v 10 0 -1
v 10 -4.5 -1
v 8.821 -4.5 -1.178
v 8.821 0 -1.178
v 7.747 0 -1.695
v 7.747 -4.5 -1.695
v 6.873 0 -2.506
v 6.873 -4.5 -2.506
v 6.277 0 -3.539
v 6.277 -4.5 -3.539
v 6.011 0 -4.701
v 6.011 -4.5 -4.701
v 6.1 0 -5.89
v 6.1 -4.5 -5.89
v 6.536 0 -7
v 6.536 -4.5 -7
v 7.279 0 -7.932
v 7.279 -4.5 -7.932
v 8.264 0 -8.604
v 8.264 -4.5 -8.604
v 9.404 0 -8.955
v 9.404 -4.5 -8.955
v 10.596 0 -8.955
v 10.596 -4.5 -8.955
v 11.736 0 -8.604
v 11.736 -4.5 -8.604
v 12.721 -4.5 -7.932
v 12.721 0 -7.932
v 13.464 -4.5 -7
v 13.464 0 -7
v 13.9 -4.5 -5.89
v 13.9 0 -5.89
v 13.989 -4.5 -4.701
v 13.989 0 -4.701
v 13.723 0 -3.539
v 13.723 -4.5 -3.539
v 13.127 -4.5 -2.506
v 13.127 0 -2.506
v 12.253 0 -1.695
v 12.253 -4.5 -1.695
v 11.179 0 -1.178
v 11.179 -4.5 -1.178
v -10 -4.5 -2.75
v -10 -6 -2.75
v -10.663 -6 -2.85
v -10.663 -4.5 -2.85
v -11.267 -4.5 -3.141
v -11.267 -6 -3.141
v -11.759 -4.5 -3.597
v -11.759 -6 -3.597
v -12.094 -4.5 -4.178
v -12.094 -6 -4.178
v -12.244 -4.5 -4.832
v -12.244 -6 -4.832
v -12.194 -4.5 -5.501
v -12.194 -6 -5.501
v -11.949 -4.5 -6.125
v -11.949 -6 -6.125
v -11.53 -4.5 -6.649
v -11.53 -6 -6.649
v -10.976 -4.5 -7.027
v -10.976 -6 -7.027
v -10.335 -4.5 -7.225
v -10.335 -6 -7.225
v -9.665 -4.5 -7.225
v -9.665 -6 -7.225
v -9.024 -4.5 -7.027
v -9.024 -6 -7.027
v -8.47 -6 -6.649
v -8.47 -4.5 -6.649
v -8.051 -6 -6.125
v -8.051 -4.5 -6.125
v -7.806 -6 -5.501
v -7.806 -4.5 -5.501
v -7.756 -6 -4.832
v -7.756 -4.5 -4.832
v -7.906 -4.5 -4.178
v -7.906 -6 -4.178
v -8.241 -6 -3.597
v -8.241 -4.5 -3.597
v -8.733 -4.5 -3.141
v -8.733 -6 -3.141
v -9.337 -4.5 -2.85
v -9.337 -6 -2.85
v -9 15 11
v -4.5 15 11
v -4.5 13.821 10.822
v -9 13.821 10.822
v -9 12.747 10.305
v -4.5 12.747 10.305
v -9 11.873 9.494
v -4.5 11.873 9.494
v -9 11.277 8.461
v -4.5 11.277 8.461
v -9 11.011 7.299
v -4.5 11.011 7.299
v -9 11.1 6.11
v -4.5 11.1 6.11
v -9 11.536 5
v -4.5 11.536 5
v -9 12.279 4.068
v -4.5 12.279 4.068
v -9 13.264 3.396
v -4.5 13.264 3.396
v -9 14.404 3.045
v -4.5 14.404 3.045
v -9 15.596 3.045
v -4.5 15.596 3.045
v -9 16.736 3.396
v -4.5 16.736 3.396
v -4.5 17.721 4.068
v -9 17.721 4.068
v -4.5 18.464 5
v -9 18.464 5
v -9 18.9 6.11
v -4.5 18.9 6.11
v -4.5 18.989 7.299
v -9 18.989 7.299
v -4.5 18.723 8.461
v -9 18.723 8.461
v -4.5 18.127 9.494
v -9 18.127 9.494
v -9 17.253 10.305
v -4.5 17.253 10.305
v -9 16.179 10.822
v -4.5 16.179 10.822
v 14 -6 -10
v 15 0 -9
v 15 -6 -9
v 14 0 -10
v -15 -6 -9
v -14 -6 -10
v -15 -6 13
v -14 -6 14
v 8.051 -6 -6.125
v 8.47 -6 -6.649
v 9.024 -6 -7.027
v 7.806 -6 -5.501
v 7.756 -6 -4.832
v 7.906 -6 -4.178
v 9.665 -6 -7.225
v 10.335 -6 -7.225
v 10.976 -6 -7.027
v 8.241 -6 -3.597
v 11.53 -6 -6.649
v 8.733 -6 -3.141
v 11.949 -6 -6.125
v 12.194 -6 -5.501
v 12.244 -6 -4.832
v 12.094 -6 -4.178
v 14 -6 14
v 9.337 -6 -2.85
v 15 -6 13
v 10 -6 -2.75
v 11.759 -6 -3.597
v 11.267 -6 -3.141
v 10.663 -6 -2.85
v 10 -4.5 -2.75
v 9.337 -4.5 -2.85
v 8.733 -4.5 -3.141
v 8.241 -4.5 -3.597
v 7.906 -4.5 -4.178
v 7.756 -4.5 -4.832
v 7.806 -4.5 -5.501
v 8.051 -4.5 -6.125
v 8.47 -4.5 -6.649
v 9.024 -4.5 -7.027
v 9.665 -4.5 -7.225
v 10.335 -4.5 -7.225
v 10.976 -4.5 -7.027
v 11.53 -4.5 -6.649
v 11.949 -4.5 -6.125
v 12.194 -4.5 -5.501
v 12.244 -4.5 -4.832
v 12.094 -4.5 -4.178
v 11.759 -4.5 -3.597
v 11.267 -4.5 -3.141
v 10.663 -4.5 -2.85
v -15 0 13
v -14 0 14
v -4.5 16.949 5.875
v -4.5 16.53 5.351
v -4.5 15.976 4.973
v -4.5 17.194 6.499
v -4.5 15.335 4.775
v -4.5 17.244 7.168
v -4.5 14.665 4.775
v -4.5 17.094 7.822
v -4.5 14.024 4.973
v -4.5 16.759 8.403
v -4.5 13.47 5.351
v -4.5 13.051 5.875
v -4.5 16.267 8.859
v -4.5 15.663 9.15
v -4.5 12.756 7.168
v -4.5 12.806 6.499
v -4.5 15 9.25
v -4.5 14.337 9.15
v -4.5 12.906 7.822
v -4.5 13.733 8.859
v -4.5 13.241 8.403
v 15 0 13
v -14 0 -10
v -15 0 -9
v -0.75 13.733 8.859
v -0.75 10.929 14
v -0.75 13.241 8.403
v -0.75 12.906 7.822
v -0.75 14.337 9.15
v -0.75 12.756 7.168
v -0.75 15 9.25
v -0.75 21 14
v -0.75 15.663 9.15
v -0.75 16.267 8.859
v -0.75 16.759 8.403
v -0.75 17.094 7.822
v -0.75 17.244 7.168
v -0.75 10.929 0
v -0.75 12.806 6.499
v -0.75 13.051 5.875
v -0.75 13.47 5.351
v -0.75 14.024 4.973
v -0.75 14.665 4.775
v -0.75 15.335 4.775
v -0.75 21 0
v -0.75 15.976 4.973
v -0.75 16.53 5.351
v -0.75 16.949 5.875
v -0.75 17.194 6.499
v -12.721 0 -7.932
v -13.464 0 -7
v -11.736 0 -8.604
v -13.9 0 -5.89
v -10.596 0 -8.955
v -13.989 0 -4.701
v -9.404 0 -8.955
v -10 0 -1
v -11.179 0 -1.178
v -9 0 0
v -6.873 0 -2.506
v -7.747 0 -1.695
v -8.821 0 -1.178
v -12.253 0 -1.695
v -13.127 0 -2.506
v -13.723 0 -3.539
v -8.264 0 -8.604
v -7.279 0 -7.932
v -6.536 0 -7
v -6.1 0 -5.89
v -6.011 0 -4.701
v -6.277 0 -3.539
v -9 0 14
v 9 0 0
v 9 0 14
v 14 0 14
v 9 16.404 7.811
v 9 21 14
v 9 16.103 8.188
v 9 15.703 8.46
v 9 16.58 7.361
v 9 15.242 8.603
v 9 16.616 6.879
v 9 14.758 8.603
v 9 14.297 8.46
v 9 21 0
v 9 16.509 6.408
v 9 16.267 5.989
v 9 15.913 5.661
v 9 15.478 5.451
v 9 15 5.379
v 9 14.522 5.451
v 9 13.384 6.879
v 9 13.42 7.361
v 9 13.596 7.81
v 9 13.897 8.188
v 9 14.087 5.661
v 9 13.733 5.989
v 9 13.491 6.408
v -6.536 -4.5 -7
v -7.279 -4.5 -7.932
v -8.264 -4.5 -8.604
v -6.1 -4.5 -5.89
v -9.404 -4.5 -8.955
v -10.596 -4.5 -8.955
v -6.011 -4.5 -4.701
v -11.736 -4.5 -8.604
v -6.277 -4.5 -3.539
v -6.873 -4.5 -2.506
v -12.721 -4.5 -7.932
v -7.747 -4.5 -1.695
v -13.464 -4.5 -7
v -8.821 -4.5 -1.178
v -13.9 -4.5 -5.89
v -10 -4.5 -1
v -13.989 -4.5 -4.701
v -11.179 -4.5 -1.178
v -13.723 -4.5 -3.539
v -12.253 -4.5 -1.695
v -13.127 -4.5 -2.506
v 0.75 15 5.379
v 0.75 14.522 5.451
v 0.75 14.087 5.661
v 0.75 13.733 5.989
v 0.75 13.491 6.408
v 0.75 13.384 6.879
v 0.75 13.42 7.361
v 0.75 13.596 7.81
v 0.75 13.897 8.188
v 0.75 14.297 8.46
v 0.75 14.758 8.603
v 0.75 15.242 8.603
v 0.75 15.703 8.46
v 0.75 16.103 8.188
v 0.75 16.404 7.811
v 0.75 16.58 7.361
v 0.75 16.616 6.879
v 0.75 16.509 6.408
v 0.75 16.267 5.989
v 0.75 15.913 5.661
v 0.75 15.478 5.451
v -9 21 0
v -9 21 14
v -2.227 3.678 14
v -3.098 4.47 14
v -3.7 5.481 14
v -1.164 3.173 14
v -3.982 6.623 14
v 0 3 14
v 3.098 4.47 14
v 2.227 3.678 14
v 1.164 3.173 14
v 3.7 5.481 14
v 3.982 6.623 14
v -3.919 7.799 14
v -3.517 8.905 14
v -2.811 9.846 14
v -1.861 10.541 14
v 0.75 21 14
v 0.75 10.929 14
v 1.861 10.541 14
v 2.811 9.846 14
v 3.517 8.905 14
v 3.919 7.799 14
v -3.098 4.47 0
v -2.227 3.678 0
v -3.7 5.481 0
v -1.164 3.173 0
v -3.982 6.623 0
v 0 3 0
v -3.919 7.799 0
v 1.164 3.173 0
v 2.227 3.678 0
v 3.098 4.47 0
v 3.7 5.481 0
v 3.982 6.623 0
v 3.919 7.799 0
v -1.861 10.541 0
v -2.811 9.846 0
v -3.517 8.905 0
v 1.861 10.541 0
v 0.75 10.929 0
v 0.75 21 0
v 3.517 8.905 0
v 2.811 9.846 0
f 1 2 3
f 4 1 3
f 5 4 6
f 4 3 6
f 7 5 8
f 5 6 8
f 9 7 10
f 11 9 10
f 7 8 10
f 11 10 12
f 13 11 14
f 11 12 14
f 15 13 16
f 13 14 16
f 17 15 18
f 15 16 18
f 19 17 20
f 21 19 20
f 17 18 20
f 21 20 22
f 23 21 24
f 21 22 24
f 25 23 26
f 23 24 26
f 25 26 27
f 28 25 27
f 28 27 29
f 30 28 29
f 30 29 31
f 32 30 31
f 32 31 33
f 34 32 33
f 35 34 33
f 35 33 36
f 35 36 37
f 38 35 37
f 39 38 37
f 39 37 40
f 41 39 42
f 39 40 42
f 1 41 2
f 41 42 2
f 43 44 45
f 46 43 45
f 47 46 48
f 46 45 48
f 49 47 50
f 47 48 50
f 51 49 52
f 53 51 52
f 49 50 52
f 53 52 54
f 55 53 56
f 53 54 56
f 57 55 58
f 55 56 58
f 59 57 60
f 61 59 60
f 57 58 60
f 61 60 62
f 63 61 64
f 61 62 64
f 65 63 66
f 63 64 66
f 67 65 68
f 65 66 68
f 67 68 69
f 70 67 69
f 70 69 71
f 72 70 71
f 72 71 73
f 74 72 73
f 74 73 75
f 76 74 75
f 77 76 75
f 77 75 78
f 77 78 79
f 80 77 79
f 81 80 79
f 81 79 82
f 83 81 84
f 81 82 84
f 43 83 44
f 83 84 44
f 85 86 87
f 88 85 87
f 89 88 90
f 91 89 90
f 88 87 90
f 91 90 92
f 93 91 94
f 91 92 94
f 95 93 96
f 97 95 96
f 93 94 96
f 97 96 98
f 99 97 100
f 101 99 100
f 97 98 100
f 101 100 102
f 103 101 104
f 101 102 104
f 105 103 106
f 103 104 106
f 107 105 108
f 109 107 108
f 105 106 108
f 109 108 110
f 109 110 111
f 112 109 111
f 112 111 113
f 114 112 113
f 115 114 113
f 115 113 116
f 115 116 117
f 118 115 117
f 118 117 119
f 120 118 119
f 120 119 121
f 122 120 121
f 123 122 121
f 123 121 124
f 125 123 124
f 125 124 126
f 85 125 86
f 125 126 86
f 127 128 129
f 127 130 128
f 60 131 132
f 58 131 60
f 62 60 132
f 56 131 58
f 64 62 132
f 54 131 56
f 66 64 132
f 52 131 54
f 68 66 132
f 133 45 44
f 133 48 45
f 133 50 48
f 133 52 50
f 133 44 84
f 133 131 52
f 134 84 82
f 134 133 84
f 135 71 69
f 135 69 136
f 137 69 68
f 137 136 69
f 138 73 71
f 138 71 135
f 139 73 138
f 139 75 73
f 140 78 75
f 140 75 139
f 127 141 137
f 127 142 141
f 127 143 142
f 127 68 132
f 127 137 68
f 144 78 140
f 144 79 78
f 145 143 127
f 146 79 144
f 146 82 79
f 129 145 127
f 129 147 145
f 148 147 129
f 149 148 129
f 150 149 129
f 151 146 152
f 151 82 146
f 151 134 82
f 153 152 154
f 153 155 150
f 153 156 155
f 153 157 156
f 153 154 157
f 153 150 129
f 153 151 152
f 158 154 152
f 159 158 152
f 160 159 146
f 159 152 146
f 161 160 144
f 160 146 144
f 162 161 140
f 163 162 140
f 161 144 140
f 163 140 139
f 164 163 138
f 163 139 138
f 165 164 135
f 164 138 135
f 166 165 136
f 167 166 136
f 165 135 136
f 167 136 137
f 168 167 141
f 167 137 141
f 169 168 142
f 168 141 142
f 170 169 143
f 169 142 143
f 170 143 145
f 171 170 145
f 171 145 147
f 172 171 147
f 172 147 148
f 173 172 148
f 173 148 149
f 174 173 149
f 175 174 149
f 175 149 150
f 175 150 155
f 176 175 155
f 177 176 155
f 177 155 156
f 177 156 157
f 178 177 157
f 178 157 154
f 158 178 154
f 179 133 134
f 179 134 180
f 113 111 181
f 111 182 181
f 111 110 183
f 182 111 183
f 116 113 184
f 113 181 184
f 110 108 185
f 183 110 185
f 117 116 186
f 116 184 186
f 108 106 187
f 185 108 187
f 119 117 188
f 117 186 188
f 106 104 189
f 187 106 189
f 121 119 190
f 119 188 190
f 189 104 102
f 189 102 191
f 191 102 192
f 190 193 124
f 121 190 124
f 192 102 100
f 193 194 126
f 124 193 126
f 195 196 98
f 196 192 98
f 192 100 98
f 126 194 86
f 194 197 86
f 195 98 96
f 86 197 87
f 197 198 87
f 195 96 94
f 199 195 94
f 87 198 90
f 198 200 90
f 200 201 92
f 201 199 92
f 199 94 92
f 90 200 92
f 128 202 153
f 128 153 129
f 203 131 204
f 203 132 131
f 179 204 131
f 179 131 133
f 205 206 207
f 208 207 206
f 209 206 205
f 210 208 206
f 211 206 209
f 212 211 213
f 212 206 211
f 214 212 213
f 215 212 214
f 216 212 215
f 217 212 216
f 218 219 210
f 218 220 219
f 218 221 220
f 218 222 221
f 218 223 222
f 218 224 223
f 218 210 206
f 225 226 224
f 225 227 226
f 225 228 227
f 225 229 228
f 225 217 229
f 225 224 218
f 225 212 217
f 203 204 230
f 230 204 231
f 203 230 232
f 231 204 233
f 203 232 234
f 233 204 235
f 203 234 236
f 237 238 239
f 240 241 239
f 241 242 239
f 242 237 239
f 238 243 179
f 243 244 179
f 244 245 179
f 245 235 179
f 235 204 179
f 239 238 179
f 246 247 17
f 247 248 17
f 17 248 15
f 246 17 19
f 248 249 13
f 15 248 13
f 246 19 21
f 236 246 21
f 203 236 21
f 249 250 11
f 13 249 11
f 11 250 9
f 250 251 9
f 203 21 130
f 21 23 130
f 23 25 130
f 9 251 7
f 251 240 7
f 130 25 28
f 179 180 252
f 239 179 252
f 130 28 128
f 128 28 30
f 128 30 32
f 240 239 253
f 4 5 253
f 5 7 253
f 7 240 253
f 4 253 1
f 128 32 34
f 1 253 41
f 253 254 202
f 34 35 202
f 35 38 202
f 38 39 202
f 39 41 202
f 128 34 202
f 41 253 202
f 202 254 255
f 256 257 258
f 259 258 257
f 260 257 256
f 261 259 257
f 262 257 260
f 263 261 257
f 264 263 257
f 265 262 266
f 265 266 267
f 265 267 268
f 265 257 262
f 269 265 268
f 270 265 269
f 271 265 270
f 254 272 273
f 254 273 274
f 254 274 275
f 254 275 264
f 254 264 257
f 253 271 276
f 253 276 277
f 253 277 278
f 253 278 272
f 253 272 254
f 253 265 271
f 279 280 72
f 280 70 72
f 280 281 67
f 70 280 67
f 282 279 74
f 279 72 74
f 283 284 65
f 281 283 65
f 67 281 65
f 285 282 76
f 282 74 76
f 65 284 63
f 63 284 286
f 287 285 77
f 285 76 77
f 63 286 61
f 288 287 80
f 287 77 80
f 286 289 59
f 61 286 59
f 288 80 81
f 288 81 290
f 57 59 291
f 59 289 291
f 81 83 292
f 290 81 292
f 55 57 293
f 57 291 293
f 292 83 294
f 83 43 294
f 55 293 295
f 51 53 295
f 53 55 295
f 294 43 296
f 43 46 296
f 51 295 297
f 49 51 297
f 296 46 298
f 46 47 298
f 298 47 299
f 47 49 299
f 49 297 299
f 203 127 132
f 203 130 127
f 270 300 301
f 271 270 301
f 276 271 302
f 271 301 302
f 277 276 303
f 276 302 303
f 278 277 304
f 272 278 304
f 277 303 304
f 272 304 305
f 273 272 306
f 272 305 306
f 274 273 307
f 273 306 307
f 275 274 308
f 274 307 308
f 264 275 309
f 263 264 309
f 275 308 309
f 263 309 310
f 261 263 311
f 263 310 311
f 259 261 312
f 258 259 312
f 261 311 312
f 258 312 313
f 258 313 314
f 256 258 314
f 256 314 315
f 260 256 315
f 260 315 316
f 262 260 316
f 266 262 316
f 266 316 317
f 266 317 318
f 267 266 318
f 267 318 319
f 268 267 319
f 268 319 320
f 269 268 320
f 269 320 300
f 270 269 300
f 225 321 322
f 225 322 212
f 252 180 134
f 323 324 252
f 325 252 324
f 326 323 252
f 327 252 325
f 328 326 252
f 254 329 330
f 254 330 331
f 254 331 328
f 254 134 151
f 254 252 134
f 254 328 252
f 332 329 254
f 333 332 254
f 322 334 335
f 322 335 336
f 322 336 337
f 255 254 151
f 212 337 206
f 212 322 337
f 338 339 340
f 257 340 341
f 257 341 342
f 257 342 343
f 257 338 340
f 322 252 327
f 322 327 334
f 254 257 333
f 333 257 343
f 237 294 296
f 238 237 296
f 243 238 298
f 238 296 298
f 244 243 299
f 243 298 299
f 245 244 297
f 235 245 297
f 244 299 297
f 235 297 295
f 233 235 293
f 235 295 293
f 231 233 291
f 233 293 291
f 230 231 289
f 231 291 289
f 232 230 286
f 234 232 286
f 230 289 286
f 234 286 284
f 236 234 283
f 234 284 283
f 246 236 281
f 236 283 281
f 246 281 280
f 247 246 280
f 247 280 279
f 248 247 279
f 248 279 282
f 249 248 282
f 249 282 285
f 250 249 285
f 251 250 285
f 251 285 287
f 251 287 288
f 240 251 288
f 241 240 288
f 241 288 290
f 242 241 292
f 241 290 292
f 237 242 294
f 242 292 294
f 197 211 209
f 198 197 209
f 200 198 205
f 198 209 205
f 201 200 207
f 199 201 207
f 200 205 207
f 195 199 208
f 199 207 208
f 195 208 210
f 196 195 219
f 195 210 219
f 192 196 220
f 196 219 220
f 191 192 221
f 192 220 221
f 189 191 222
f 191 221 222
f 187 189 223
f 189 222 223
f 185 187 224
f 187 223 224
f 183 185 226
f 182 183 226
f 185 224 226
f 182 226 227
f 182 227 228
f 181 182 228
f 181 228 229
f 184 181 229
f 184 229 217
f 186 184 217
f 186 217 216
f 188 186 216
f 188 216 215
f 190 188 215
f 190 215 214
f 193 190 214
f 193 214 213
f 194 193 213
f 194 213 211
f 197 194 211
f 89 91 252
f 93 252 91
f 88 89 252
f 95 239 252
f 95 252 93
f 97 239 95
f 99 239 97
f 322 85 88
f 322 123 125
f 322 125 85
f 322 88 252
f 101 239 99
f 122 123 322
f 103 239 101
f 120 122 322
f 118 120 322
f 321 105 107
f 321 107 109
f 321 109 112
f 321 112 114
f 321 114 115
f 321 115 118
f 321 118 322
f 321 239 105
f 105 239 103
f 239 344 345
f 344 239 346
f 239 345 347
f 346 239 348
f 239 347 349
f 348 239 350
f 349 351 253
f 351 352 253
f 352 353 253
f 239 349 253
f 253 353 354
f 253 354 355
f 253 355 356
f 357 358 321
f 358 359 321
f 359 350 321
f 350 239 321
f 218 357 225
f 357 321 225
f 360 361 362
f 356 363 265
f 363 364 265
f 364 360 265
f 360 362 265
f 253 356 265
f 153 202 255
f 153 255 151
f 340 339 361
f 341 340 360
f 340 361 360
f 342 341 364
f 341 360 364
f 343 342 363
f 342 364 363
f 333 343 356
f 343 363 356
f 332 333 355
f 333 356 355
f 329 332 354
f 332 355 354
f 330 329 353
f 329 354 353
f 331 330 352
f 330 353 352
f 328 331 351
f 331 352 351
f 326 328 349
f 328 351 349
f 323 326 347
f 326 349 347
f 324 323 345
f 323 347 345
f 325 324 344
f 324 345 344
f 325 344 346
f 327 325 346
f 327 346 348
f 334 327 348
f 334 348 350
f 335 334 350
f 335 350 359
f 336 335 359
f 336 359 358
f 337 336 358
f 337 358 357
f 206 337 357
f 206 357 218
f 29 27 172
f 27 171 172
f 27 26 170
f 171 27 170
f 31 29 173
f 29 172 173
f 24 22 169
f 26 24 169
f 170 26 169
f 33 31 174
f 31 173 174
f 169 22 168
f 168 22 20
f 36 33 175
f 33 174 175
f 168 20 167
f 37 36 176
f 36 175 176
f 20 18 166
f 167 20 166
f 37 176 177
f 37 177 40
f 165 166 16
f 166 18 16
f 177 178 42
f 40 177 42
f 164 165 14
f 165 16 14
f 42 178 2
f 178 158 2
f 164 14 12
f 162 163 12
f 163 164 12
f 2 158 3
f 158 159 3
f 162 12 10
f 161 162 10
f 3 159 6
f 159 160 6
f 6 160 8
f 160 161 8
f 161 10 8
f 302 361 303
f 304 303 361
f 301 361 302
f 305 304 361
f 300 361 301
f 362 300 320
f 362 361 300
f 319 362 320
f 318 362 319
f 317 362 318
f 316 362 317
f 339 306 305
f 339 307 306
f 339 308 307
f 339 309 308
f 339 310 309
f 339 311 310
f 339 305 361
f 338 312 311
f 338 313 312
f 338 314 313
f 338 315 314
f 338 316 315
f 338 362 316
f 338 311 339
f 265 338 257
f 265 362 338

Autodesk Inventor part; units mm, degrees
ref_plane "YZ Plane" through (0, 0, 0) normal (1, 0, 0) x (0, 1, 0)
ref_plane "XZ Plane" through (0, 0, 0) normal (0, 1, 0) x (-1, 0, 0)
ref_plane "XY Plane" through (0, 0, 0) normal (0, 0, 1) x (1, 0, 0)
sketch "スケッチ1" plane through (0, 0, 0) normal (0, 0, 1) x (1, 0, 0)
  line L0 (-9, 21) -> (9, 21)
  line L1 (9, 21) -> (9, 0)
  line L2 (9, 0) -> (-9, 0)
  line L3 (-9, 0) -> (-9, 21)
  point P0 (0, 0)
  point P1 (0, 0)
  dimension "d0" = 18
  dimension "d1" = 21
extrude "押し出し1" add sketch "スケッチ1" along normal blind 14
sketch "スケッチ3" plane through (0, 0, 14) normal (0, 0, 1) x (1, 0, 0)
  line L0 (-9, 21) -> (9, 21) projected
  point P0 (0, 0)
  point P1 (0, 7)
  point P2 (0, 21)
  dimension "d41" = 14
hole "穴2" at (0, 7, 14) direction (0, 0, -1) diameter 8 end through all
sketch "スケッチ4" plane through (-9, 21, 0) normal (0, 1, 0) x (1, 0, 0)
  line L0 (0, -14) -> (18, -14) projected
  line L1 (0, 0) -> (18, 0) projected
  line L2 (8.25, 0) -> (9.75, 0)
  line L3 (9.75, 0) -> (9.75, -14)
  line L4 (9.75, -14) -> (8.25, -14)
  line L5 (8.25, -14) -> (8.25, 0)
  point P0 (9, 0)
  point P1 (9, 0)
  point P2 (9, 0)
  dimension "d21" = 1.5
extrude "押し出し2" cut sketch "スケッチ4" against normal up to surface
sketch "スケッチ5" plane through (-9, 0, 0) normal (-1, 0, 0) x (0, 0, 1)
  line L0 (0, 21) -> (14, 21) projected
  point P0 (7, 15)
  point P1 (7, 21)
  dimension "d42" = 6
hole "穴3" at (-9, 15, 7) direction (1, 0, 0) diameter 4.5 end up to surface counterbore diameter 8 counterbore depth 4.5
sketch "スケッチ6" plane through (9, 0, 0) normal (1, 0, 0) x (0, 0, -1)
  circle A0 centre (-7, 15) radius 2.25 projected
hole "穴4" at (9, 15, 7) direction (-1, 0, 0) diameter 3.242 end up to surface thread size "M4x0.7" class "6H" standard "ANSI Metric M Profile"
sketch "スケッチ9" plane through (-9, 0, 0) normal (0, -1, 0) x (1, 0, 0)
  line L0 (18, 14) -> (0, 14) projected
  line L1 (18, 0) -> (0, 0) projected
  line L2 (-6, 14) -> (24, 14)
  line L3 (24, 14) -> (24, -10)
  line L4 (24, -10) -> (-6, -10)
  line L5 (-6, -10) -> (-6, 14)
  point P0 (9, -10)
  point P1 (9, 0)
  dimension "d46" = 30
  dimension "d47" = 24
extrude "押し出し5" add sketch "スケッチ9" along normal blind 6
sketch "スケッチ10" plane through (-9, 0, 0) normal (0, 1, 0) x (1, 0, 0)
  line L0 (24, 10) -> (-6, 10) projected
  point P0 (9, 0)
  point P1 (-1, 5)
  point P2 (19, 5)
  dimension "d50" = 10
  dimension "d51" = 10
  dimension "d52" = 5
hole "穴5" at (-10, 0, -5) at (10, 0, -5) direction (0, -1, 0) diameter 4.5 end through all counterbore diameter 8 counterbore depth 4.5
chamfer "面取り1" distance 1 angle 45 4 edges at (15, -3, 14) (-15, -3, 14) (-15, -3, -10) (15, -3, -10)
equation "\"d51\" = d50"
properties part number "06" material "SUS303"
